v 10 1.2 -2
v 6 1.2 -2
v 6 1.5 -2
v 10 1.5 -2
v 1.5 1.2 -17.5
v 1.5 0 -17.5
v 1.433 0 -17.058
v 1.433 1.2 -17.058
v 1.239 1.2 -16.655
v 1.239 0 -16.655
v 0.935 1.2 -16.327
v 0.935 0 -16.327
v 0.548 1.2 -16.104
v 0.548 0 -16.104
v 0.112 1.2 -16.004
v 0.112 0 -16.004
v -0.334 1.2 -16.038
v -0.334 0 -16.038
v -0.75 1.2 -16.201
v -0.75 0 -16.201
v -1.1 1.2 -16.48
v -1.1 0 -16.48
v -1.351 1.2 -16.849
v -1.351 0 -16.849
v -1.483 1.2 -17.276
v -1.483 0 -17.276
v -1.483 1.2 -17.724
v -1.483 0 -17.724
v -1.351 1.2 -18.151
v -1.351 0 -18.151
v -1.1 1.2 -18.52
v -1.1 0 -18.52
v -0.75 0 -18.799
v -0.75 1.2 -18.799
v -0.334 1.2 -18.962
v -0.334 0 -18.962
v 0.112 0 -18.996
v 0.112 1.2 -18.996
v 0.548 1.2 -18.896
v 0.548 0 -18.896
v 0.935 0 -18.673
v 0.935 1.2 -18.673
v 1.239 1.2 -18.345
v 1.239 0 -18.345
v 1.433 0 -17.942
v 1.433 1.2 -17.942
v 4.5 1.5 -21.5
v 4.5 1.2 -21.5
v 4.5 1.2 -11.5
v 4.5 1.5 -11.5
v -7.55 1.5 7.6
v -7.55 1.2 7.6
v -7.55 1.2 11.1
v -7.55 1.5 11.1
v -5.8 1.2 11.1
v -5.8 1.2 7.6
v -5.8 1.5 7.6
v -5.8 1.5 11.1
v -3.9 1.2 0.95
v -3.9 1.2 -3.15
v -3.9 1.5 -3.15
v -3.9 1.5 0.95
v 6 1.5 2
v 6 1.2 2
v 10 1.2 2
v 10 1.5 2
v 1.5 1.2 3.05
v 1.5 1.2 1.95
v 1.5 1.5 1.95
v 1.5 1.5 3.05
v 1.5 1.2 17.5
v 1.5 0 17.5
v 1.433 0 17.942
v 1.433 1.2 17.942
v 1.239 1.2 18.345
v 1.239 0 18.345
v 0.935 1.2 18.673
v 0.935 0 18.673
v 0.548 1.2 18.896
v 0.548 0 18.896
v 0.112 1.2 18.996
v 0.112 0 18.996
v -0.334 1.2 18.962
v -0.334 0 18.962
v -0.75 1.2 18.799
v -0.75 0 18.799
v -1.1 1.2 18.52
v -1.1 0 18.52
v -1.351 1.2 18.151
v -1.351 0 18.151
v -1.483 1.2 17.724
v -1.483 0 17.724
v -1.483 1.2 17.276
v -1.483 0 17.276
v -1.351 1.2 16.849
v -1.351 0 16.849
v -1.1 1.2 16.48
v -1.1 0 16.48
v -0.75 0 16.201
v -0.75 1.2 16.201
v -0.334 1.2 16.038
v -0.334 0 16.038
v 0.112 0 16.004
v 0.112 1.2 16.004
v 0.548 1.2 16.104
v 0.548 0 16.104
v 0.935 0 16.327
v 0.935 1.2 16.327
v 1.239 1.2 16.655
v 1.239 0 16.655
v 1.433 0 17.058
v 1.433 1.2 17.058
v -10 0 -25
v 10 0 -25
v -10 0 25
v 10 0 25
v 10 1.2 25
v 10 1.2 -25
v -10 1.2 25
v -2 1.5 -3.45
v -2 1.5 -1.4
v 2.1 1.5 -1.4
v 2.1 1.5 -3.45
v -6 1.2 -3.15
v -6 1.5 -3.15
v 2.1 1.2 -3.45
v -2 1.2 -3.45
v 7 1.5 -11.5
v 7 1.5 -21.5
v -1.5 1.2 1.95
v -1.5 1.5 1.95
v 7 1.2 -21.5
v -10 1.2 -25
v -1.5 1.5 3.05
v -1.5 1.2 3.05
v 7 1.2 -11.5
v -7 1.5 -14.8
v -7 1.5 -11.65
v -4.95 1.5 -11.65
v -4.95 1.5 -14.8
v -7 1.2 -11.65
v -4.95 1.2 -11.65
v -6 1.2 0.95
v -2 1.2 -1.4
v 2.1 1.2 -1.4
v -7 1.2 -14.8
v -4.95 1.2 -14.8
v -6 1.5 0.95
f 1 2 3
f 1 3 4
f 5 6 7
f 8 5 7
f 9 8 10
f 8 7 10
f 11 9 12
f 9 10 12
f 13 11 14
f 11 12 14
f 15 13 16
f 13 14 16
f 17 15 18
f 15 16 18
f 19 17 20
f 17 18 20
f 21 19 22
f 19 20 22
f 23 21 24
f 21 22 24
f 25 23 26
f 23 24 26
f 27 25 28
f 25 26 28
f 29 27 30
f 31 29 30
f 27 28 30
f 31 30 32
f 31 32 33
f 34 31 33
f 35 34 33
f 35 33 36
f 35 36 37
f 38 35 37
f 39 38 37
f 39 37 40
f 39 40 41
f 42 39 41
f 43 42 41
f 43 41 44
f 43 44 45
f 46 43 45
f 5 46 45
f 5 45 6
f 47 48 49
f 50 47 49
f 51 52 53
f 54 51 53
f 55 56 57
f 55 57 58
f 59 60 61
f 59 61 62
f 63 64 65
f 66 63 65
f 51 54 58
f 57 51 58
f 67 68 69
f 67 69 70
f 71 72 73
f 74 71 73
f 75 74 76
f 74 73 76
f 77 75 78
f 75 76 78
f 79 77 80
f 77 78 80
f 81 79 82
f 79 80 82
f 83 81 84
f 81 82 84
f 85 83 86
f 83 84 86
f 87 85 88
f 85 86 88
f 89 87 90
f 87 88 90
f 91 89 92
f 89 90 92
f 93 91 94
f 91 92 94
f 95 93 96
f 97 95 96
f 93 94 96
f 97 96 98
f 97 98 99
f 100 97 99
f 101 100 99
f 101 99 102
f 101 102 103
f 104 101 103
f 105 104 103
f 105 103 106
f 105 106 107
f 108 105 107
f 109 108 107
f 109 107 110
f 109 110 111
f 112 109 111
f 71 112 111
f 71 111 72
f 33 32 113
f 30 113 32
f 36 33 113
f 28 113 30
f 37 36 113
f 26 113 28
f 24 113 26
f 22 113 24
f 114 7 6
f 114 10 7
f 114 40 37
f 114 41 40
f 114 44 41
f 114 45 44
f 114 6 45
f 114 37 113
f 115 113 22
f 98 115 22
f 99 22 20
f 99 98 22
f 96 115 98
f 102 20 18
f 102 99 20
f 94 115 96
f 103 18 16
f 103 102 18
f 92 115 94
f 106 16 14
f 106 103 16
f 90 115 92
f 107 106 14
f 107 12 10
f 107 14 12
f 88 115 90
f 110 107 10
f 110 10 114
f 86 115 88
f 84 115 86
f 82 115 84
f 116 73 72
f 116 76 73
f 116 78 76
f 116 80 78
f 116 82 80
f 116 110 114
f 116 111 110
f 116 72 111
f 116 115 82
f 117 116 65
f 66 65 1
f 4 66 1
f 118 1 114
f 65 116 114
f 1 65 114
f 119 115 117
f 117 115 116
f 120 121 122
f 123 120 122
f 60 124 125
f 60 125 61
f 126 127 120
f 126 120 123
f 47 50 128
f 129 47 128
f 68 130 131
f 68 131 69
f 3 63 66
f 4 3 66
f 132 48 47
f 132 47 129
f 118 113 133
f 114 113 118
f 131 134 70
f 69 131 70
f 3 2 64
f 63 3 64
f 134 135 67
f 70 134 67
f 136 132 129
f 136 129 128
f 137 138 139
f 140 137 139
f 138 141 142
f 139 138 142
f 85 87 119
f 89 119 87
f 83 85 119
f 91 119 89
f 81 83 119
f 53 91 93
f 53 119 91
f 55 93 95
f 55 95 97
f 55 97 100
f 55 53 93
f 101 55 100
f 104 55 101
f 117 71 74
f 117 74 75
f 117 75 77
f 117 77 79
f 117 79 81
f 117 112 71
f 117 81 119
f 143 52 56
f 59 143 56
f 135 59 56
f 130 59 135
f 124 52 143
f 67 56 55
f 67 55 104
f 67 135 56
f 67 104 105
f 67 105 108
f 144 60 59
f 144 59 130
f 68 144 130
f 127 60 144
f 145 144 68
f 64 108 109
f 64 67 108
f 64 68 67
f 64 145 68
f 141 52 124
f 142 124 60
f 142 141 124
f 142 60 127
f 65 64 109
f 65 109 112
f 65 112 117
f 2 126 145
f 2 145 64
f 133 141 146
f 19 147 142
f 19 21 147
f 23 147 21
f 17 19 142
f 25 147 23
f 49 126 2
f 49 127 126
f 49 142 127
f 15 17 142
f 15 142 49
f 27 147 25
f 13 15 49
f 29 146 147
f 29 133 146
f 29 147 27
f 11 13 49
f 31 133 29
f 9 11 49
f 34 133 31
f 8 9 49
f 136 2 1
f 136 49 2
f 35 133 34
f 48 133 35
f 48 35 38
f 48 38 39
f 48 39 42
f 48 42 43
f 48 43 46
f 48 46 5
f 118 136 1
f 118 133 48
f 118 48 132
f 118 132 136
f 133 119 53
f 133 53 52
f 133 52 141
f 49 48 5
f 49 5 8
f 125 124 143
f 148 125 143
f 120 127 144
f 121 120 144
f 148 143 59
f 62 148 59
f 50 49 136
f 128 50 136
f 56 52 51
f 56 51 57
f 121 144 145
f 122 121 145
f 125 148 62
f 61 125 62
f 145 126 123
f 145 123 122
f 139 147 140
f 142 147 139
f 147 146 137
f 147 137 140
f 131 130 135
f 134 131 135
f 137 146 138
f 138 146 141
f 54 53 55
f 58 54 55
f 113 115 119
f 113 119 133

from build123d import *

# Parameters (mm, degrees)
SKETCH1_W           = 20
SKETCH1_H           = 50
BOSS_EXTRUDE1_DEPTH = 1.2
SKETCH2_R           = 1.5
CUT_EXTRUDE1_DEPTH  = 2.2
SKETCH3_W           = 2.5
SKETCH3_H           = 10
SKETCH3_W_2         = 2.05
SKETCH3_H_2         = 3.15
SKETCH3_W_3         = 2.1
SKETCH3_H_3         = 4.1
SKETCH3_W_4         = 4.1
SKETCH3_H_4         = 2.05
SKETCH3_W_5         = 3
SKETCH3_H_5         = 1.1
SKETCH3_W_6         = 4
SKETCH3_H_6         = 4
SKETCH3_W_7         = 1.75
SKETCH3_H_7         = 3.5
BOSS_EXTRUDE2_DEPTH = 1.5


with BuildPart() as part:
    # Sketch1 → Boss-Extrude1 (new body)
    with BuildSketch(Plane(origin=(0, 0, 0), x_dir=(1, 0, 0), z_dir=(0, 1, 0))):
        Rectangle(SKETCH1_W, SKETCH1_H)
    extrude(amount=BOSS_EXTRUDE1_DEPTH)

    # Sketch2 → Cut-Extrude1 (cut, through all)
    with BuildSketch(Plane.XZ):
        with Locations((0, 17.5)):
            Circle(SKETCH2_R)
        with Locations((0, -17.5)):
            Circle(SKETCH2_R)
    extrude(amount=-CUT_EXTRUDE1_DEPTH, mode=Mode.SUBTRACT)

    # Sketch3 → Boss-Extrude2 (add)
    with BuildSketch(Plane.XZ):
        with Locations((5.75, -16.5)):
            Rectangle(SKETCH3_W, SKETCH3_H)
        with Locations((-5.975, -13.225)):
            Rectangle(SKETCH3_W_2, SKETCH3_H_2)
        with Locations((-4.95, -1.1)):
            Rectangle(SKETCH3_W_3, SKETCH3_H_3)
        with Locations((0.05, -2.425)):
            Rectangle(SKETCH3_W_4, SKETCH3_H_4)
        with Locations((0, 2.5)):
            Rectangle(SKETCH3_W_5, SKETCH3_H_5)
        with Locations((8, 0)):
            Rectangle(SKETCH3_W_6, SKETCH3_H_6)
        with Locations((-6.675, 9.35)):
            Rectangle(SKETCH3_W_7, SKETCH3_H_7)
    extrude(amount=-BOSS_EXTRUDE2_DEPTH)


solid = part.part
